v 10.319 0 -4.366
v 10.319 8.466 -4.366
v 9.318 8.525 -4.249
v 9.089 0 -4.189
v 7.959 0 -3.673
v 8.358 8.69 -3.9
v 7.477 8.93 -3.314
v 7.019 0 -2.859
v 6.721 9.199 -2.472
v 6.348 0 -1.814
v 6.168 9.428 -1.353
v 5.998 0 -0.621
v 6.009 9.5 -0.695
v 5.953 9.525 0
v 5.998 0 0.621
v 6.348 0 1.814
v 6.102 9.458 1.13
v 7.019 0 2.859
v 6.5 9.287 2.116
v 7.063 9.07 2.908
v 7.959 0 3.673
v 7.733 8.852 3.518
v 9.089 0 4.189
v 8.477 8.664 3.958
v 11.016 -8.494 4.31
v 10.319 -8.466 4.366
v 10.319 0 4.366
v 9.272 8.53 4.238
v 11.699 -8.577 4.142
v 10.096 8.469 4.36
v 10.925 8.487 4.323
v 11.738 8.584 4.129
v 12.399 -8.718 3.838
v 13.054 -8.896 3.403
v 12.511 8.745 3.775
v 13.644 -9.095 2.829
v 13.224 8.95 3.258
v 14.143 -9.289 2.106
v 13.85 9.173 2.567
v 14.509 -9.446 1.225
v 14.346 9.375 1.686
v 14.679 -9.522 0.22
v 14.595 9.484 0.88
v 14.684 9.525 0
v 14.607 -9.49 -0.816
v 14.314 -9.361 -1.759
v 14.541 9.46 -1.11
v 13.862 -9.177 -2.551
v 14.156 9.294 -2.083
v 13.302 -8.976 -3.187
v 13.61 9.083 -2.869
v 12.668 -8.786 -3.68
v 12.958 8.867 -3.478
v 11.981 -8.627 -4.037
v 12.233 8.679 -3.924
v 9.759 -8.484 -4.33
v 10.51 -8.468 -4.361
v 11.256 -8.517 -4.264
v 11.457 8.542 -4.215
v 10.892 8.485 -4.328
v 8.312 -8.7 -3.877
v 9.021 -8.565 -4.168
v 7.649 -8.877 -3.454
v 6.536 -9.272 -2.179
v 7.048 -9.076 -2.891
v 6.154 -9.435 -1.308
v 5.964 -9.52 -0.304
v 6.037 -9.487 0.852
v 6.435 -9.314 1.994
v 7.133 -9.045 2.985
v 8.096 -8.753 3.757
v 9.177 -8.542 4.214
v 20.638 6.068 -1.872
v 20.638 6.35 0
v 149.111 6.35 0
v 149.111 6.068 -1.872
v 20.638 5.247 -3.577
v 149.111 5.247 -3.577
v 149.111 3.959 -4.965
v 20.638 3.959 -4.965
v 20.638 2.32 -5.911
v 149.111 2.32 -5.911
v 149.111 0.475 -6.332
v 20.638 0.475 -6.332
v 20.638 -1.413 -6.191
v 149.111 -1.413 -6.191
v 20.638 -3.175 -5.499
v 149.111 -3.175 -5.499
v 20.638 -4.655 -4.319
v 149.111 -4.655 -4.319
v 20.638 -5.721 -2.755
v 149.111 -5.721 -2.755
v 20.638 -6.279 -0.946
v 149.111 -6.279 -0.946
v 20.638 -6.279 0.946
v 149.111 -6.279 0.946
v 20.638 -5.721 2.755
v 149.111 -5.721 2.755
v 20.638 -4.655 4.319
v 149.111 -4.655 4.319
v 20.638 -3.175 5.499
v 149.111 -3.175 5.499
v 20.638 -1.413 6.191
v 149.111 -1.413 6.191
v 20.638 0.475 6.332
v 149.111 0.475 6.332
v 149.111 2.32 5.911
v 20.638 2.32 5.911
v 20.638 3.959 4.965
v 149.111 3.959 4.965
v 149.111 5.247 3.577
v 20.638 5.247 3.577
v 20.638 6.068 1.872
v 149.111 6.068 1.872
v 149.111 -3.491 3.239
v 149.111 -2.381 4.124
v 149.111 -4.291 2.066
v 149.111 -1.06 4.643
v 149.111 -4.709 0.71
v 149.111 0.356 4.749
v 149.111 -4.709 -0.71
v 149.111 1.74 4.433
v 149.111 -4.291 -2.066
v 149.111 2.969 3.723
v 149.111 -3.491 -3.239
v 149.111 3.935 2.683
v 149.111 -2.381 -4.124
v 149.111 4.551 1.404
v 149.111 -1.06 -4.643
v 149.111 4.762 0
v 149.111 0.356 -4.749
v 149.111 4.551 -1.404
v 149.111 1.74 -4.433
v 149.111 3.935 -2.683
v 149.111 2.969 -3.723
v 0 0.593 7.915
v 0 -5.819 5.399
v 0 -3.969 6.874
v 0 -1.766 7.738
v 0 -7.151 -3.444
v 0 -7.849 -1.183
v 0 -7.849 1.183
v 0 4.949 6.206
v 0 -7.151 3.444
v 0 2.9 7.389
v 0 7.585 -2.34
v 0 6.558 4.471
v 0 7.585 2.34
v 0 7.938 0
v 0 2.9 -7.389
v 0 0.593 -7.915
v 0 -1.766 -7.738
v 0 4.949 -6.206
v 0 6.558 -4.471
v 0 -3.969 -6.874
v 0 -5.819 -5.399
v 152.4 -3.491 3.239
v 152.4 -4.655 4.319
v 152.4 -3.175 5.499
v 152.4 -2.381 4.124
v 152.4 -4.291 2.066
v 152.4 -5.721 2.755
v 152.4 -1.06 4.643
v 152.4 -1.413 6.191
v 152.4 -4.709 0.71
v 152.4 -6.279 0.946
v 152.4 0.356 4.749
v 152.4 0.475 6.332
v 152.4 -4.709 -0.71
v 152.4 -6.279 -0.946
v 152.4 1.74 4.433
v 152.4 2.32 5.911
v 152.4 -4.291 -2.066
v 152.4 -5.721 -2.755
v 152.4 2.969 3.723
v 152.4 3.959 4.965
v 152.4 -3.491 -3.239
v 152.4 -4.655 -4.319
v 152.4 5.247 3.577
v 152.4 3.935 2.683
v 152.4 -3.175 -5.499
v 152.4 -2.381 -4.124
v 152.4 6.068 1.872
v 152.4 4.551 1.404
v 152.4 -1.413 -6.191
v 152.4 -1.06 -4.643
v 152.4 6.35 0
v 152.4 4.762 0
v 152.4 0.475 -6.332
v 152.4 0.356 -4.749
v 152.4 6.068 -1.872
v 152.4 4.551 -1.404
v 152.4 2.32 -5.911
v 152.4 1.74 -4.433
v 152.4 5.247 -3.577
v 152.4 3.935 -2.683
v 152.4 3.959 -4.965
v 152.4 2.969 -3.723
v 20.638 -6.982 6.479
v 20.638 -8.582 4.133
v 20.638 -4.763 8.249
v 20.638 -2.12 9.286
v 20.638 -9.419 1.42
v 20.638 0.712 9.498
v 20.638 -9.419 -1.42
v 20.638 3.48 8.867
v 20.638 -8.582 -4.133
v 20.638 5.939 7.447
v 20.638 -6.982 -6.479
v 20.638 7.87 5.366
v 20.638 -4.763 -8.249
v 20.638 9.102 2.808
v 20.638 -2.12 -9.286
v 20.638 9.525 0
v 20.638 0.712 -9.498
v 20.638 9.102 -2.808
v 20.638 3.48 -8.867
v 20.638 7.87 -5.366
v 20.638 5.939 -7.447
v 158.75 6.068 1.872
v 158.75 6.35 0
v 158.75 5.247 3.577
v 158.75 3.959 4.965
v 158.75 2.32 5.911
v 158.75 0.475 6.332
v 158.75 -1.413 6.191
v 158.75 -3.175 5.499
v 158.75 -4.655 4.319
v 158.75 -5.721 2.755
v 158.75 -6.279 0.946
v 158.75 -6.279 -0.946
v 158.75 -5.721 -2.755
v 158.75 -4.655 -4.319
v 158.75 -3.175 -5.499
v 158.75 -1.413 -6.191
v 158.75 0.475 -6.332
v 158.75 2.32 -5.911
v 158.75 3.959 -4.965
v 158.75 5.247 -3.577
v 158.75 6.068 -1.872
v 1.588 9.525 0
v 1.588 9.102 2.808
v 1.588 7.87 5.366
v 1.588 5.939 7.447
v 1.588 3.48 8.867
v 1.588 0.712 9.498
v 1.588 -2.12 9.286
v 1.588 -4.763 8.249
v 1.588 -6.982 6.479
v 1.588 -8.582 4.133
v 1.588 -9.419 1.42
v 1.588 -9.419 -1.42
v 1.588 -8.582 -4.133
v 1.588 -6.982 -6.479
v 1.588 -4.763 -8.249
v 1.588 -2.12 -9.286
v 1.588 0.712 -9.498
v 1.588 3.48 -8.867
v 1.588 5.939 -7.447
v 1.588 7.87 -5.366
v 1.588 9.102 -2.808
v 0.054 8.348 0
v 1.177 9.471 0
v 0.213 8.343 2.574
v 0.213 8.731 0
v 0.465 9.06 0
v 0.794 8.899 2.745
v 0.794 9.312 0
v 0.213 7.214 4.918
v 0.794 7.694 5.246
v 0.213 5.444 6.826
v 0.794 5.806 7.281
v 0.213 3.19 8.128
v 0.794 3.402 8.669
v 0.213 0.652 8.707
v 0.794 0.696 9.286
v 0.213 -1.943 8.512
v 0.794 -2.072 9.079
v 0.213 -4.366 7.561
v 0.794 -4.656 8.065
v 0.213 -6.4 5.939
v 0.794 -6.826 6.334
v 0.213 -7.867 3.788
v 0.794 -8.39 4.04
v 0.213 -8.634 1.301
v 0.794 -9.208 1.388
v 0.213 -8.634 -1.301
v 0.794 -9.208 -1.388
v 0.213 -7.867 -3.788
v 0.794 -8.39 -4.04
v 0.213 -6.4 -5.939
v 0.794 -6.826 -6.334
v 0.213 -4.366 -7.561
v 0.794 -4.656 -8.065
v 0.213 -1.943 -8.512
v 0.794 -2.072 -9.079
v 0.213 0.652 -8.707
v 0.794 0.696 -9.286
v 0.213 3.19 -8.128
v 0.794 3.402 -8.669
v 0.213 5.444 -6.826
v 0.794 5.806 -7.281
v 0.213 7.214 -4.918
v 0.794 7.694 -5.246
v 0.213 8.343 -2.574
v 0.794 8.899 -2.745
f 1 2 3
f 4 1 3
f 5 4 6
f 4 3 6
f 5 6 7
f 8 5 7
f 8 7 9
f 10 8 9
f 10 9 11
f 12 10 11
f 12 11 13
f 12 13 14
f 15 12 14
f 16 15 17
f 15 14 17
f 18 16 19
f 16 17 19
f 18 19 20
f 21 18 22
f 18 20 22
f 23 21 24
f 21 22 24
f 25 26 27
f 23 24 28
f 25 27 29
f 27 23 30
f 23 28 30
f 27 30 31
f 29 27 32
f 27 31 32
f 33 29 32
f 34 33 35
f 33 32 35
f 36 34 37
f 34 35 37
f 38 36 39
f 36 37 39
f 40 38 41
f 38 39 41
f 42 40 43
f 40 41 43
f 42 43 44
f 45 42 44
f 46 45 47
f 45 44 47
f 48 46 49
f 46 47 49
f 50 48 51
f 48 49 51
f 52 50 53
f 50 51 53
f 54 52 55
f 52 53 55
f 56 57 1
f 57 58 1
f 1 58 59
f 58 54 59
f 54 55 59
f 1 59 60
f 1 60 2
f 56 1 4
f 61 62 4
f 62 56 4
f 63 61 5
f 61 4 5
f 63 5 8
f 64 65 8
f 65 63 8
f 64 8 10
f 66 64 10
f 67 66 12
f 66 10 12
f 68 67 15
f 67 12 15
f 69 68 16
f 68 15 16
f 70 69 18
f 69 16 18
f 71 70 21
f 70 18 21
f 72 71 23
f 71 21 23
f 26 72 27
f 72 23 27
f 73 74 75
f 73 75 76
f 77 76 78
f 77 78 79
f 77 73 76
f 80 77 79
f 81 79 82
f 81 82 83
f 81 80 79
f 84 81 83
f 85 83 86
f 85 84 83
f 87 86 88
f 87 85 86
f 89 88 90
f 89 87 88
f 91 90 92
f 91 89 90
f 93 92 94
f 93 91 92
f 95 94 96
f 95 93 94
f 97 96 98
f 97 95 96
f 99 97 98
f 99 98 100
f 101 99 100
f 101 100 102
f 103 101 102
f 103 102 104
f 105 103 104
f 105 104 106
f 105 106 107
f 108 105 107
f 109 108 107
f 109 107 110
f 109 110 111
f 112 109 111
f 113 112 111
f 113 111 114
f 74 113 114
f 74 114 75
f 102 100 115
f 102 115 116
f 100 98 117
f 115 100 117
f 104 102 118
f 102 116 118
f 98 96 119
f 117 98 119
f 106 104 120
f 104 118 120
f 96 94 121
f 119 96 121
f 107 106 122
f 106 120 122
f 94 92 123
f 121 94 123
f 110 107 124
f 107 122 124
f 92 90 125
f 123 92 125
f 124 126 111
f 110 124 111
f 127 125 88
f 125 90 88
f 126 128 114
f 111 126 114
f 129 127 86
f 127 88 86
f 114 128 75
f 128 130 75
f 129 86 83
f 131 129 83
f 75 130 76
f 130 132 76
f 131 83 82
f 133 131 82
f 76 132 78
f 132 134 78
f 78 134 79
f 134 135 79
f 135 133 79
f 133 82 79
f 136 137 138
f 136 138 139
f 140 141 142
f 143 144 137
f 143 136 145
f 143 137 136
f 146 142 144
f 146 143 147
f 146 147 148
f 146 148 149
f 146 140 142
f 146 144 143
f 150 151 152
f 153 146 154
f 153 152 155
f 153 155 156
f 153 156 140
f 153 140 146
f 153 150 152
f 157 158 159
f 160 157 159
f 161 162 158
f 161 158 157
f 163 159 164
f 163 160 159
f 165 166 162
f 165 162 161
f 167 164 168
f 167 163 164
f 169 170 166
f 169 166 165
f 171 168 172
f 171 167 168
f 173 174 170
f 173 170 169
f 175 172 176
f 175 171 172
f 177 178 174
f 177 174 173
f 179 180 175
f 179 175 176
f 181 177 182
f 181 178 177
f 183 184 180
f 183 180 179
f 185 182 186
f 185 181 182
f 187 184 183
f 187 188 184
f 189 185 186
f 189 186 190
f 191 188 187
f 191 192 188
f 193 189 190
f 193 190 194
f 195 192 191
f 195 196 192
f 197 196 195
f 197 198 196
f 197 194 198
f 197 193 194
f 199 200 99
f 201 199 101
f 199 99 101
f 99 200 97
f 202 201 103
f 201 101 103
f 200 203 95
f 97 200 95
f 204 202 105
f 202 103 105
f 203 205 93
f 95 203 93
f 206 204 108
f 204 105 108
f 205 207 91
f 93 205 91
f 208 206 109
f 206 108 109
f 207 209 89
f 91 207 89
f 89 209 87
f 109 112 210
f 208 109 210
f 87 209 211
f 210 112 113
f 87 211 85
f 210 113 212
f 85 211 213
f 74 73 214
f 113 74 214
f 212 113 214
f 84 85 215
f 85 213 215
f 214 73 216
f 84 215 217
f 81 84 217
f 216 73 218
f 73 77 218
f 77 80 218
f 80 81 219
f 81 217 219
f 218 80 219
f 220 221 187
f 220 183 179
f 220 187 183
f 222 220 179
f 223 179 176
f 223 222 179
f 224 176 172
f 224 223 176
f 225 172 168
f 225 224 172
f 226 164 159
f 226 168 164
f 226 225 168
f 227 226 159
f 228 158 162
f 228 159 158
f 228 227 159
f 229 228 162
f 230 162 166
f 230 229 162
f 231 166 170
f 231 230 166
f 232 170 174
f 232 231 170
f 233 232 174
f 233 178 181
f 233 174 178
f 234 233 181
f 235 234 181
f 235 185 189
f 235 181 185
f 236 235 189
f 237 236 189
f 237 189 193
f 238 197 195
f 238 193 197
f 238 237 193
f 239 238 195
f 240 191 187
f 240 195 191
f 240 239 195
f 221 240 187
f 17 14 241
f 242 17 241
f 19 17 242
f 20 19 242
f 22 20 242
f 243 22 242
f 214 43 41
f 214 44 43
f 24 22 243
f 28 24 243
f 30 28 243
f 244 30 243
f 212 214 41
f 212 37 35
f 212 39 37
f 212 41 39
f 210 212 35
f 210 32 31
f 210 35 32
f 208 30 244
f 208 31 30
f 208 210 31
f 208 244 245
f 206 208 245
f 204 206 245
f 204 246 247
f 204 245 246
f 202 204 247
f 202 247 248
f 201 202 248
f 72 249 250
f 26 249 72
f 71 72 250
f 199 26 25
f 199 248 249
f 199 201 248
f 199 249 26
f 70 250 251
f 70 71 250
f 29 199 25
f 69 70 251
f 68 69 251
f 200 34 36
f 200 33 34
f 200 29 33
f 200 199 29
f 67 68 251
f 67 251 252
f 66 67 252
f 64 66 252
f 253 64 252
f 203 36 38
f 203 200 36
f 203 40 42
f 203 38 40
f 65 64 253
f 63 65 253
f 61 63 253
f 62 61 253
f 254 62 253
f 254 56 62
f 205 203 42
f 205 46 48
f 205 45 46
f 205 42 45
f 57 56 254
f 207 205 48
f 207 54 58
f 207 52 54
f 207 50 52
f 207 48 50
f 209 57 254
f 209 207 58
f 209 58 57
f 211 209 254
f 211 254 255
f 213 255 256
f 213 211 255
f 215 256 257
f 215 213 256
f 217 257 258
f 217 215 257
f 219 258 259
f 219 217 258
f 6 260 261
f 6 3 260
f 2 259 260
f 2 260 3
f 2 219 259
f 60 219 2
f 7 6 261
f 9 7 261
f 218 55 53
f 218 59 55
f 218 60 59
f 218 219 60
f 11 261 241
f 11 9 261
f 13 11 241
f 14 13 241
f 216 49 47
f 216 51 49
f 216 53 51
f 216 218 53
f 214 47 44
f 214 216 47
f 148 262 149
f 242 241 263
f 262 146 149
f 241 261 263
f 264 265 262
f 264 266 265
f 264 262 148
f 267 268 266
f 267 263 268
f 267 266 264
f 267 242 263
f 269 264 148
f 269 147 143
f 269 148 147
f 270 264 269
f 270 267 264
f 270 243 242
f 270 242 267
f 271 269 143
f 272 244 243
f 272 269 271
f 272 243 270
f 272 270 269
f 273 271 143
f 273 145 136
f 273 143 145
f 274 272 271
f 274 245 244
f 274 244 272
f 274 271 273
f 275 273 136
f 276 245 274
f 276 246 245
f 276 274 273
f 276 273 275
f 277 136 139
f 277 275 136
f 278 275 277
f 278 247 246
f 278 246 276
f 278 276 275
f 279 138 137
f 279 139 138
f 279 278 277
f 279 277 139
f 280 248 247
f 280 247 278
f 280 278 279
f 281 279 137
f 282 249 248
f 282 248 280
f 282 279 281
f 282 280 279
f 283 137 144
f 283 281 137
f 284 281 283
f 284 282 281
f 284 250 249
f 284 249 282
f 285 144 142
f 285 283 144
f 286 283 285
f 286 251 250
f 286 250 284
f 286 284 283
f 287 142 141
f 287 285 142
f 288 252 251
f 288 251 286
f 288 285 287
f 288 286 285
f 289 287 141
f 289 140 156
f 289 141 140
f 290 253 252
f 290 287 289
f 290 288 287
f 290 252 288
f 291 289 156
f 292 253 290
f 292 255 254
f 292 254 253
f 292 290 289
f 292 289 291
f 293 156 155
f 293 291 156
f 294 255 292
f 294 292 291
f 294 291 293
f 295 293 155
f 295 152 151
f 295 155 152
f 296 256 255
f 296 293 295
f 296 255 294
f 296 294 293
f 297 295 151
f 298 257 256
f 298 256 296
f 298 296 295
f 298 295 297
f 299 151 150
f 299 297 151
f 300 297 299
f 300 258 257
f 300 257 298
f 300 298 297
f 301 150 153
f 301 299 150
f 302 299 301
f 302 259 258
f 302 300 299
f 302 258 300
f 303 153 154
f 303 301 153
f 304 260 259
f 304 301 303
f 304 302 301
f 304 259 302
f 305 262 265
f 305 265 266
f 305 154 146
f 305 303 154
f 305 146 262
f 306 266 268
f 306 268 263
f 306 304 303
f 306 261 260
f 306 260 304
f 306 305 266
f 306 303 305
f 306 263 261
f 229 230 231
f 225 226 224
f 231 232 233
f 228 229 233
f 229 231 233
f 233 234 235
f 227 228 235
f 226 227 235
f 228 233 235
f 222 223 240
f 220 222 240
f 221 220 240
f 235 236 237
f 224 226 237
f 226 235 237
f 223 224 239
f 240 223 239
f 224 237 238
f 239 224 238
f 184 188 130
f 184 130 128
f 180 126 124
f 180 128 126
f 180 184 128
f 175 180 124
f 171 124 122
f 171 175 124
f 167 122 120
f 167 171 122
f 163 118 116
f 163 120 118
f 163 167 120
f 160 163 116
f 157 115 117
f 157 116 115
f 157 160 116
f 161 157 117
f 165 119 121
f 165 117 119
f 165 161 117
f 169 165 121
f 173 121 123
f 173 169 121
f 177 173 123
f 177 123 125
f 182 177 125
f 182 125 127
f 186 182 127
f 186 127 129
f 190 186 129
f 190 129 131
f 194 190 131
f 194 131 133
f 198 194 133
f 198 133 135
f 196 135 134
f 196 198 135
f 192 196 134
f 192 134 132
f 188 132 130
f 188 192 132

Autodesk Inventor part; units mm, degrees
ref_plane "YZ Plane" through (0, 0, 0) normal (1, 0, 0) x (0, 1, 0)
ref_plane "XZ Plane" through (0, 0, 0) normal (0, 1, 0) x (-1, 0, 0)
ref_plane "XY Plane" through (0, 0, 0) normal (0, 0, 1) x (1, 0, 0)
sketch "Sketch1" plane through (0, 0, 0) normal (0, 0, 1) x (1, 0, 0)
  line L0 (0, 0) -> (0, 9.525)
  line L1 (0, 9.525) -> (20.6375, 9.525)
  line L2 (20.6375, 9.525) -> (20.6375, 6.35)
  line L3 (149.1107, 6.35) -> (149.1107, 4.7625)
  line L4 (149.1107, 4.7625) -> (152.4, 4.7625)
  line L5 (152.4, 4.7625) -> (152.4, 6.35)
  line L6 (152.4, 6.35) -> (158.75, 6.35)
  line L7 (158.75, 6.35) -> (158.75, 0)
  line L8 (158.75, 0) -> (0, 0)
  line L9 (149.1107, 6.35) -> (127, 6.35)
  line L10 (127, 6.35) -> (26.9875, 6.35)
  line L11 (26.9875, 6.35) -> (20.6375, 6.35)
  dimension "d0" = 9.525
  dimension "d1" = 20.6375
  dimension "d2" = 158.75
  dimension "d4" = 6.35
  dimension "d7" = 4.7625
  dimension "d8" = 3.2893
  dimension "d10" = 6.35
  dimension "d11" = 100.0125
  dimension "d12" = 6.35
revolve "Revolution1" add sketch "Sketch1" angle 360 about axis through (158.75, 0, 0) along (-1, 0, 0)
thread "Thread1" size "5/8-8 Acme" class "2G" standard "Acme Threads" length 100.0125 offset 22.1107
sketch "Sketch2" plane through (0, 0, 0) normal (0, 1, 0) x (-1, 0, 0)
  circle A0 centre (-10.3188, 0) radius 4.3656
  line L0 (0, 9.525) -> (0, -9.525) projected
  point P0 (0, 0)
  dimension "d15" = 8.7312
  dimension "d27" = 10.3187
  dimension "d28" = 9.525
hole "Hole1" at (10.3188, 0, 0) direction (0, 1, 0) diameter 8.7313 end through all
sketch "Sketch3" plane through (0, 0, 0) normal (0, 1, 0) x (-1, 0, 0)
  circle A0 centre (-10.3188, 0) radius 4.3656
  line L0 (0, 9.525) -> (0, -9.525) projected
  point P0 (0, 0)
  dimension "d23" = 10.3187
  dimension "d24" = 8.7312
  dimension "d26" = 9.525
hole "Hole2" at (10.3188, 0, 0) direction (0, -1, 0) diameter 8.7313 end through all
fillet "Fillet1" radius 1.5875 1 edges at (0, -9.525, 0)
properties part number "VS-004 (VISE SCREW)" material "Steel, Alloy"
